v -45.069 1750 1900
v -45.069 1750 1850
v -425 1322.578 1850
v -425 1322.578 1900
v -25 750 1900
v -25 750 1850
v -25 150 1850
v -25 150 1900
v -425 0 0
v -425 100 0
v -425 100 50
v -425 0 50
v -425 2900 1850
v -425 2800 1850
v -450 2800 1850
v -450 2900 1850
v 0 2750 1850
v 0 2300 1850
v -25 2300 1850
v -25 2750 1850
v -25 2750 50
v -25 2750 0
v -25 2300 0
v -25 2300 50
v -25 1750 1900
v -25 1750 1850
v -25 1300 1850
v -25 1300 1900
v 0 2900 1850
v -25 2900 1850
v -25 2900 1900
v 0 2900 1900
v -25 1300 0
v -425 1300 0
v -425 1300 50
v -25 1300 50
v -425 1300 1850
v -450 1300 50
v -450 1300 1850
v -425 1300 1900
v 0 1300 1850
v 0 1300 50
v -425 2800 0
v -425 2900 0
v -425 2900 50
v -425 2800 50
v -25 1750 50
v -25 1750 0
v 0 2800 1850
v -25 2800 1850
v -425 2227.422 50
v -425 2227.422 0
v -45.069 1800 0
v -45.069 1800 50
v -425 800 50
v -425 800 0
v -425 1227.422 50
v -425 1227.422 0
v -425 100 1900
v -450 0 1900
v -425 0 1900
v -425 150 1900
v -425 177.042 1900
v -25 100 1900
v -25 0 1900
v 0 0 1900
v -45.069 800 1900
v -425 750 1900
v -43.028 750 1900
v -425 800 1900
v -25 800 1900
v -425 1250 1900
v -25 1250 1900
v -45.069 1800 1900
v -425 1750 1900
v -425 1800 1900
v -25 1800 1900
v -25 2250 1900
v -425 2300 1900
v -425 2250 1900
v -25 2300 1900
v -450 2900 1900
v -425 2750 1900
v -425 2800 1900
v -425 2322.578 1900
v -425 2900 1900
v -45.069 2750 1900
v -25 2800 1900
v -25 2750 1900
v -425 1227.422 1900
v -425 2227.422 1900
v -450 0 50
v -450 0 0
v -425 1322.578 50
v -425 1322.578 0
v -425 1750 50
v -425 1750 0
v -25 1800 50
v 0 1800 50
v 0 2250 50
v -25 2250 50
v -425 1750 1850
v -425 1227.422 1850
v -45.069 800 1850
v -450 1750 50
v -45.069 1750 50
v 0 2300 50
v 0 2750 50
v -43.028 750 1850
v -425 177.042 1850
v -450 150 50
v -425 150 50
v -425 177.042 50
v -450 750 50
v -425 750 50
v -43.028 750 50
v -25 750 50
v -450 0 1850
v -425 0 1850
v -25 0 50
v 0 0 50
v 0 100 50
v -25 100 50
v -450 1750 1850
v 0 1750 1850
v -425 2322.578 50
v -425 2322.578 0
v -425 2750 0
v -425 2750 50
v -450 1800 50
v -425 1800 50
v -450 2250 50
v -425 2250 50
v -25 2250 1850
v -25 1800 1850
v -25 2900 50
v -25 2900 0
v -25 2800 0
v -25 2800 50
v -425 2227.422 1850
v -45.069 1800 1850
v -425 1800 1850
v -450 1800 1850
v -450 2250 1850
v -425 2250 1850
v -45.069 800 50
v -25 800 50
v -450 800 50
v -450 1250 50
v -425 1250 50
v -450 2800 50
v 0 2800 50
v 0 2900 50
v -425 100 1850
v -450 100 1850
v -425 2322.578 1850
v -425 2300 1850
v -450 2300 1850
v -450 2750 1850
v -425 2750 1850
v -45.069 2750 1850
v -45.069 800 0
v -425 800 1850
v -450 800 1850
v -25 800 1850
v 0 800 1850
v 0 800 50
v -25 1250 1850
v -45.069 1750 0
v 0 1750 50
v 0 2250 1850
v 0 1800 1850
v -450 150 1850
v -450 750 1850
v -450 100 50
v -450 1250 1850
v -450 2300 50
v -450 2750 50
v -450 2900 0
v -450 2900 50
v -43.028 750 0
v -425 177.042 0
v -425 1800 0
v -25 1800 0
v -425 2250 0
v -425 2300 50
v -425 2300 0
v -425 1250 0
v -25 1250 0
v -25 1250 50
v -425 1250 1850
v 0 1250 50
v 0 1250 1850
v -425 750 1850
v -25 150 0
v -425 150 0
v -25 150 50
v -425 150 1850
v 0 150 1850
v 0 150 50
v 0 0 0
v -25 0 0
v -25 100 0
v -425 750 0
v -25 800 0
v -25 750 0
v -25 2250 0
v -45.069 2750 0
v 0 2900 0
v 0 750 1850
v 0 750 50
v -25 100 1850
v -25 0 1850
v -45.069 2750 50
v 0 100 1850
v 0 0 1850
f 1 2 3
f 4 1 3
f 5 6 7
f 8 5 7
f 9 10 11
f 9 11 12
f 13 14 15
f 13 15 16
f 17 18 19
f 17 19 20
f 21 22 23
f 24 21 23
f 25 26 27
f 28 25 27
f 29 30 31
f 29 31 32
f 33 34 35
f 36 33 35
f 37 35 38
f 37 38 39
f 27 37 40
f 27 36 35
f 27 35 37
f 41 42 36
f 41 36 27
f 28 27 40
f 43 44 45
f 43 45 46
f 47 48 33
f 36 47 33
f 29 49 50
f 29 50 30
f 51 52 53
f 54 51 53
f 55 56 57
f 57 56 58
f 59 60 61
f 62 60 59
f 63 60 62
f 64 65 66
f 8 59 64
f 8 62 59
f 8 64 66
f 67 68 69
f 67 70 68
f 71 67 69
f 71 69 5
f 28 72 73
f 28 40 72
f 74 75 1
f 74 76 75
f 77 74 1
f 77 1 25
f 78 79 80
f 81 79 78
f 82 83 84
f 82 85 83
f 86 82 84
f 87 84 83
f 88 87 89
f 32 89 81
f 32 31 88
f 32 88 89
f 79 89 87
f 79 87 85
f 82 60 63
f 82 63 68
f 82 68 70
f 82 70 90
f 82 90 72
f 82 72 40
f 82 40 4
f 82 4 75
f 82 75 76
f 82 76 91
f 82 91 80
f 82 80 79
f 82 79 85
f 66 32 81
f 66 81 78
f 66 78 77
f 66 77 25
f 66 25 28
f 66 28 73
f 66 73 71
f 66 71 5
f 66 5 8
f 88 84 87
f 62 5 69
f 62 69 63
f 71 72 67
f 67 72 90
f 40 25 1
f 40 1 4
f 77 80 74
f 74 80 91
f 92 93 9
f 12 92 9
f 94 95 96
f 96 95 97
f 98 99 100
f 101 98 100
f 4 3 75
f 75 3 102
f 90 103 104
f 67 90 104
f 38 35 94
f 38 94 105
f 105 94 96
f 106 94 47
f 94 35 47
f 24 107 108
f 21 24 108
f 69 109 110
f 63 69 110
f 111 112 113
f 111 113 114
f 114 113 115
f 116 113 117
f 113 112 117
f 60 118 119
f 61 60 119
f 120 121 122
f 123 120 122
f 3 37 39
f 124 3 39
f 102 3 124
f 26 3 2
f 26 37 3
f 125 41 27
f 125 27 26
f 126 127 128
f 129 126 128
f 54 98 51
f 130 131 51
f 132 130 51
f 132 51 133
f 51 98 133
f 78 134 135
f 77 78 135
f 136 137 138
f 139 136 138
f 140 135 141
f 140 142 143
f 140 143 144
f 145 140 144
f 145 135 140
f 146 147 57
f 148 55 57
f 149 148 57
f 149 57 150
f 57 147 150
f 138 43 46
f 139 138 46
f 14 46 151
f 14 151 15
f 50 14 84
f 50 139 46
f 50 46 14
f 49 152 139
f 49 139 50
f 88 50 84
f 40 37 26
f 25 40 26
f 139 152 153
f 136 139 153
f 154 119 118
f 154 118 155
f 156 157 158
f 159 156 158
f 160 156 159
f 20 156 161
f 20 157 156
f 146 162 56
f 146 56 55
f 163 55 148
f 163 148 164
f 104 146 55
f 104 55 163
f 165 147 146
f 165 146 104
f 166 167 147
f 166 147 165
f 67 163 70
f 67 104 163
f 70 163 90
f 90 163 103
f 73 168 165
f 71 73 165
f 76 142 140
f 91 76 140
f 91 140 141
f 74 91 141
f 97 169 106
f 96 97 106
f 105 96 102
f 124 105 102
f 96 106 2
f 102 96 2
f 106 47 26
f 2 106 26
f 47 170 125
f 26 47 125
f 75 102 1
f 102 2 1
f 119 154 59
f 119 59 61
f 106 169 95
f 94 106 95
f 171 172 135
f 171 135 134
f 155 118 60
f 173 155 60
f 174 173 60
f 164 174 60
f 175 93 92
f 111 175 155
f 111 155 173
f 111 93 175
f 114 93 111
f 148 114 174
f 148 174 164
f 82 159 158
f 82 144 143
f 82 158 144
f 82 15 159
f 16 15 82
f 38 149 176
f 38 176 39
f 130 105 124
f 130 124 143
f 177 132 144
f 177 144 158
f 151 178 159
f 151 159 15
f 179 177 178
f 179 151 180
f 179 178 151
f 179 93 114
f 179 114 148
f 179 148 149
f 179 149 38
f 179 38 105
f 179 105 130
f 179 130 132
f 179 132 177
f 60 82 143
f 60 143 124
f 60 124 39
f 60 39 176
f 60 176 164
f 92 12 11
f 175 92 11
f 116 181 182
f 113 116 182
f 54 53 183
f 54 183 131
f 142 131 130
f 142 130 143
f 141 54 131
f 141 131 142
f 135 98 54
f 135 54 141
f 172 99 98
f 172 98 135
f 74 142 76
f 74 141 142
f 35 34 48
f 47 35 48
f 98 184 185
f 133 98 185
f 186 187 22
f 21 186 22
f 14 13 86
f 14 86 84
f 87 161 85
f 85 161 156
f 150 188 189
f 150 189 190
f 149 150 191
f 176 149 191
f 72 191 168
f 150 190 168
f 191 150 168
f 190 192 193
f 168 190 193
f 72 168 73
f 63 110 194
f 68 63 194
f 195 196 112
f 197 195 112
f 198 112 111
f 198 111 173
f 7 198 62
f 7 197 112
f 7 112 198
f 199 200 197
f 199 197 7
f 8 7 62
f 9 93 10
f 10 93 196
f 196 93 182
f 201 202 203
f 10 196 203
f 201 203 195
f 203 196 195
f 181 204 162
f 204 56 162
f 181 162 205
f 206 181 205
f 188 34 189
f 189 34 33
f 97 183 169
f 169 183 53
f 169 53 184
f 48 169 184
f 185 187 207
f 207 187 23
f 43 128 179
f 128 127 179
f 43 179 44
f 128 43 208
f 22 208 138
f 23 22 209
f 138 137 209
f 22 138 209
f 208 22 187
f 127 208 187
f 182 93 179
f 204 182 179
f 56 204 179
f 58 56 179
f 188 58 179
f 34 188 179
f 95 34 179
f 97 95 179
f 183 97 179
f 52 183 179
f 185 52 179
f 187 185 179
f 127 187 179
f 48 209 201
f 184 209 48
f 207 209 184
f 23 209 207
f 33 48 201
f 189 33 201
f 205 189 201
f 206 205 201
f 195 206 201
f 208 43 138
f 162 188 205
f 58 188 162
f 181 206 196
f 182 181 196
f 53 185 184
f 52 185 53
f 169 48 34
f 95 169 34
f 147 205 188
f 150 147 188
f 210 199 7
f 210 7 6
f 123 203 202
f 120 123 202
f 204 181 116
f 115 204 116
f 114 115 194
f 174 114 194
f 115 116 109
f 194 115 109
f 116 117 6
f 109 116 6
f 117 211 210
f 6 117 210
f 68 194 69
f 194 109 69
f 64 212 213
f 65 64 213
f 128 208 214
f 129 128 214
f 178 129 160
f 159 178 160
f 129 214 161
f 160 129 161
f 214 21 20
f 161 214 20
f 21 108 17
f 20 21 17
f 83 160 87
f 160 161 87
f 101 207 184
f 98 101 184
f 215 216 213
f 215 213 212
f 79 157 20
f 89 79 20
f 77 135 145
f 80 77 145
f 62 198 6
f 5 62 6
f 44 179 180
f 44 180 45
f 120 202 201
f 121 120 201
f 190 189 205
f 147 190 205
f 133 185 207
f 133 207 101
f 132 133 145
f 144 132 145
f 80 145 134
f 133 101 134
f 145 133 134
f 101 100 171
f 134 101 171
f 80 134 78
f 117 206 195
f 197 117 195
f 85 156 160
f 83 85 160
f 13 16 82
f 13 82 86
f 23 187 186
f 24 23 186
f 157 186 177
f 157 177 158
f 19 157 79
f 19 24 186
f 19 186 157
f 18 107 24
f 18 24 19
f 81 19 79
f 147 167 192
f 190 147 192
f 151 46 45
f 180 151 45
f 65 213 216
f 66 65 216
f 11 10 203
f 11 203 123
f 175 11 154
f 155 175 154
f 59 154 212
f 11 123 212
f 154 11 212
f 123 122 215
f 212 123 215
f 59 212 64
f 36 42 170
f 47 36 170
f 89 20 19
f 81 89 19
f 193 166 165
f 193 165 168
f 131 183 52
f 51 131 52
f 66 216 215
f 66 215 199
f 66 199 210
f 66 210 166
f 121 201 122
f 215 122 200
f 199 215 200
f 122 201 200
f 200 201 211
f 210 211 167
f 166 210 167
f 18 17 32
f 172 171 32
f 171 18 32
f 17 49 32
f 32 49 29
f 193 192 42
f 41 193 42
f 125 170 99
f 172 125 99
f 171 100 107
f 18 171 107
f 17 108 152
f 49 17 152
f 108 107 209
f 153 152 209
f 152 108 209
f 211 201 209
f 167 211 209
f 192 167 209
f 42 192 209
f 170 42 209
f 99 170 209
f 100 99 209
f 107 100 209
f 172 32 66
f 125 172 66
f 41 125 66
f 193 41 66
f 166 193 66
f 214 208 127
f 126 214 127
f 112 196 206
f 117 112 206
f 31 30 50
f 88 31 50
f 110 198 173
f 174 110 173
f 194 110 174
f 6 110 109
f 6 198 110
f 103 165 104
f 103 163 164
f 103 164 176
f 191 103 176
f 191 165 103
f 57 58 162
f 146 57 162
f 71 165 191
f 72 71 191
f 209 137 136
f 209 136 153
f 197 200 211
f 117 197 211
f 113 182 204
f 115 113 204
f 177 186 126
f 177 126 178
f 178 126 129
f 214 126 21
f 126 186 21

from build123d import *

# Parameters (mm, degrees)
F0_W     = 450
F0_H     = 2900
F1_DEPTH = 1900
F2_W     = 100
F2_H     = 1800
F2_W_2   = 600
F2_W_3   = 450
F3_DEPTH = 450
F4_W     = 400
F4_H     = 100
F5_DEPTH = 2900


with BuildPart() as f1:
    # F0 (on Top) → F1 (new body)
    with BuildSketch(Plane.XY):
        with Locations((-225, 1450)):
            Rectangle(F0_W, F0_H)
    extrude(amount=F1_DEPTH)

    # F2 (on face) → F3 (cut)
    with BuildSketch(Plane.YZ):
        with Locations((50, 950)):
            Rectangle(F2_W, F2_H)
        with Locations((450, 950)):
            Rectangle(F2_W_2, F2_H)
        with Locations((1025, 950)):
            Rectangle(F2_W_3, F2_H)
        with Locations((1525, 950)):
            Rectangle(F2_W_3, F2_H)
        with Locations((2025, 950)):
            Rectangle(F2_W_3, F2_H)
        with Locations((2525, 950)):
            Rectangle(F2_W_3, F2_H)
        with Locations((2850, 950)):
            Rectangle(F2_W, F2_H)
    extrude(amount=-F3_DEPTH, mode=Mode.SUBTRACT)

    # F4 (on face) → F5 (cut)
    with BuildSketch(Plane(origin=(0, 0, 0), x_dir=(1, 0, 0), z_dir=(0, 0, -1))):
        with Locations((-225, -50)):
            Rectangle(F4_W, F4_H)
        Polygon((-25, -150), (-425, -150), (-25, -750), align=None)
        Polygon((-425, -177.041635), (-425, -750), (-43.027756, -750), align=None)
        Polygon((-45.069324, -800), (-425, -800), (-425, -1227.42201), align=None)
        Polygon((-25, -800), (-425, -1250), (-25, -1250), align=None)
        Polygon((-25, -1300), (-425, -1300), (-25, -1750), align=None)
        Polygon((-425, -1322.57799), (-425, -1750), (-45.069324, -1750), align=None)
        Polygon((-45.069324, -1800), (-425, -1800), (-425, -2227.42201), align=None)
        Polygon((-25, -1800), (-425, -2250), (-25, -2250), align=None)
        Polygon((-425, -2322.57799), (-425, -2750), (-45.069324, -2750), align=None)
        Polygon((-25, -2300), (-425, -2300), (-25, -2750), align=None)
        with Locations((-225, -2850)):
            Rectangle(F4_W, F4_H)
    extrude(amount=-F5_DEPTH, mode=Mode.SUBTRACT)


solid = f1.part
